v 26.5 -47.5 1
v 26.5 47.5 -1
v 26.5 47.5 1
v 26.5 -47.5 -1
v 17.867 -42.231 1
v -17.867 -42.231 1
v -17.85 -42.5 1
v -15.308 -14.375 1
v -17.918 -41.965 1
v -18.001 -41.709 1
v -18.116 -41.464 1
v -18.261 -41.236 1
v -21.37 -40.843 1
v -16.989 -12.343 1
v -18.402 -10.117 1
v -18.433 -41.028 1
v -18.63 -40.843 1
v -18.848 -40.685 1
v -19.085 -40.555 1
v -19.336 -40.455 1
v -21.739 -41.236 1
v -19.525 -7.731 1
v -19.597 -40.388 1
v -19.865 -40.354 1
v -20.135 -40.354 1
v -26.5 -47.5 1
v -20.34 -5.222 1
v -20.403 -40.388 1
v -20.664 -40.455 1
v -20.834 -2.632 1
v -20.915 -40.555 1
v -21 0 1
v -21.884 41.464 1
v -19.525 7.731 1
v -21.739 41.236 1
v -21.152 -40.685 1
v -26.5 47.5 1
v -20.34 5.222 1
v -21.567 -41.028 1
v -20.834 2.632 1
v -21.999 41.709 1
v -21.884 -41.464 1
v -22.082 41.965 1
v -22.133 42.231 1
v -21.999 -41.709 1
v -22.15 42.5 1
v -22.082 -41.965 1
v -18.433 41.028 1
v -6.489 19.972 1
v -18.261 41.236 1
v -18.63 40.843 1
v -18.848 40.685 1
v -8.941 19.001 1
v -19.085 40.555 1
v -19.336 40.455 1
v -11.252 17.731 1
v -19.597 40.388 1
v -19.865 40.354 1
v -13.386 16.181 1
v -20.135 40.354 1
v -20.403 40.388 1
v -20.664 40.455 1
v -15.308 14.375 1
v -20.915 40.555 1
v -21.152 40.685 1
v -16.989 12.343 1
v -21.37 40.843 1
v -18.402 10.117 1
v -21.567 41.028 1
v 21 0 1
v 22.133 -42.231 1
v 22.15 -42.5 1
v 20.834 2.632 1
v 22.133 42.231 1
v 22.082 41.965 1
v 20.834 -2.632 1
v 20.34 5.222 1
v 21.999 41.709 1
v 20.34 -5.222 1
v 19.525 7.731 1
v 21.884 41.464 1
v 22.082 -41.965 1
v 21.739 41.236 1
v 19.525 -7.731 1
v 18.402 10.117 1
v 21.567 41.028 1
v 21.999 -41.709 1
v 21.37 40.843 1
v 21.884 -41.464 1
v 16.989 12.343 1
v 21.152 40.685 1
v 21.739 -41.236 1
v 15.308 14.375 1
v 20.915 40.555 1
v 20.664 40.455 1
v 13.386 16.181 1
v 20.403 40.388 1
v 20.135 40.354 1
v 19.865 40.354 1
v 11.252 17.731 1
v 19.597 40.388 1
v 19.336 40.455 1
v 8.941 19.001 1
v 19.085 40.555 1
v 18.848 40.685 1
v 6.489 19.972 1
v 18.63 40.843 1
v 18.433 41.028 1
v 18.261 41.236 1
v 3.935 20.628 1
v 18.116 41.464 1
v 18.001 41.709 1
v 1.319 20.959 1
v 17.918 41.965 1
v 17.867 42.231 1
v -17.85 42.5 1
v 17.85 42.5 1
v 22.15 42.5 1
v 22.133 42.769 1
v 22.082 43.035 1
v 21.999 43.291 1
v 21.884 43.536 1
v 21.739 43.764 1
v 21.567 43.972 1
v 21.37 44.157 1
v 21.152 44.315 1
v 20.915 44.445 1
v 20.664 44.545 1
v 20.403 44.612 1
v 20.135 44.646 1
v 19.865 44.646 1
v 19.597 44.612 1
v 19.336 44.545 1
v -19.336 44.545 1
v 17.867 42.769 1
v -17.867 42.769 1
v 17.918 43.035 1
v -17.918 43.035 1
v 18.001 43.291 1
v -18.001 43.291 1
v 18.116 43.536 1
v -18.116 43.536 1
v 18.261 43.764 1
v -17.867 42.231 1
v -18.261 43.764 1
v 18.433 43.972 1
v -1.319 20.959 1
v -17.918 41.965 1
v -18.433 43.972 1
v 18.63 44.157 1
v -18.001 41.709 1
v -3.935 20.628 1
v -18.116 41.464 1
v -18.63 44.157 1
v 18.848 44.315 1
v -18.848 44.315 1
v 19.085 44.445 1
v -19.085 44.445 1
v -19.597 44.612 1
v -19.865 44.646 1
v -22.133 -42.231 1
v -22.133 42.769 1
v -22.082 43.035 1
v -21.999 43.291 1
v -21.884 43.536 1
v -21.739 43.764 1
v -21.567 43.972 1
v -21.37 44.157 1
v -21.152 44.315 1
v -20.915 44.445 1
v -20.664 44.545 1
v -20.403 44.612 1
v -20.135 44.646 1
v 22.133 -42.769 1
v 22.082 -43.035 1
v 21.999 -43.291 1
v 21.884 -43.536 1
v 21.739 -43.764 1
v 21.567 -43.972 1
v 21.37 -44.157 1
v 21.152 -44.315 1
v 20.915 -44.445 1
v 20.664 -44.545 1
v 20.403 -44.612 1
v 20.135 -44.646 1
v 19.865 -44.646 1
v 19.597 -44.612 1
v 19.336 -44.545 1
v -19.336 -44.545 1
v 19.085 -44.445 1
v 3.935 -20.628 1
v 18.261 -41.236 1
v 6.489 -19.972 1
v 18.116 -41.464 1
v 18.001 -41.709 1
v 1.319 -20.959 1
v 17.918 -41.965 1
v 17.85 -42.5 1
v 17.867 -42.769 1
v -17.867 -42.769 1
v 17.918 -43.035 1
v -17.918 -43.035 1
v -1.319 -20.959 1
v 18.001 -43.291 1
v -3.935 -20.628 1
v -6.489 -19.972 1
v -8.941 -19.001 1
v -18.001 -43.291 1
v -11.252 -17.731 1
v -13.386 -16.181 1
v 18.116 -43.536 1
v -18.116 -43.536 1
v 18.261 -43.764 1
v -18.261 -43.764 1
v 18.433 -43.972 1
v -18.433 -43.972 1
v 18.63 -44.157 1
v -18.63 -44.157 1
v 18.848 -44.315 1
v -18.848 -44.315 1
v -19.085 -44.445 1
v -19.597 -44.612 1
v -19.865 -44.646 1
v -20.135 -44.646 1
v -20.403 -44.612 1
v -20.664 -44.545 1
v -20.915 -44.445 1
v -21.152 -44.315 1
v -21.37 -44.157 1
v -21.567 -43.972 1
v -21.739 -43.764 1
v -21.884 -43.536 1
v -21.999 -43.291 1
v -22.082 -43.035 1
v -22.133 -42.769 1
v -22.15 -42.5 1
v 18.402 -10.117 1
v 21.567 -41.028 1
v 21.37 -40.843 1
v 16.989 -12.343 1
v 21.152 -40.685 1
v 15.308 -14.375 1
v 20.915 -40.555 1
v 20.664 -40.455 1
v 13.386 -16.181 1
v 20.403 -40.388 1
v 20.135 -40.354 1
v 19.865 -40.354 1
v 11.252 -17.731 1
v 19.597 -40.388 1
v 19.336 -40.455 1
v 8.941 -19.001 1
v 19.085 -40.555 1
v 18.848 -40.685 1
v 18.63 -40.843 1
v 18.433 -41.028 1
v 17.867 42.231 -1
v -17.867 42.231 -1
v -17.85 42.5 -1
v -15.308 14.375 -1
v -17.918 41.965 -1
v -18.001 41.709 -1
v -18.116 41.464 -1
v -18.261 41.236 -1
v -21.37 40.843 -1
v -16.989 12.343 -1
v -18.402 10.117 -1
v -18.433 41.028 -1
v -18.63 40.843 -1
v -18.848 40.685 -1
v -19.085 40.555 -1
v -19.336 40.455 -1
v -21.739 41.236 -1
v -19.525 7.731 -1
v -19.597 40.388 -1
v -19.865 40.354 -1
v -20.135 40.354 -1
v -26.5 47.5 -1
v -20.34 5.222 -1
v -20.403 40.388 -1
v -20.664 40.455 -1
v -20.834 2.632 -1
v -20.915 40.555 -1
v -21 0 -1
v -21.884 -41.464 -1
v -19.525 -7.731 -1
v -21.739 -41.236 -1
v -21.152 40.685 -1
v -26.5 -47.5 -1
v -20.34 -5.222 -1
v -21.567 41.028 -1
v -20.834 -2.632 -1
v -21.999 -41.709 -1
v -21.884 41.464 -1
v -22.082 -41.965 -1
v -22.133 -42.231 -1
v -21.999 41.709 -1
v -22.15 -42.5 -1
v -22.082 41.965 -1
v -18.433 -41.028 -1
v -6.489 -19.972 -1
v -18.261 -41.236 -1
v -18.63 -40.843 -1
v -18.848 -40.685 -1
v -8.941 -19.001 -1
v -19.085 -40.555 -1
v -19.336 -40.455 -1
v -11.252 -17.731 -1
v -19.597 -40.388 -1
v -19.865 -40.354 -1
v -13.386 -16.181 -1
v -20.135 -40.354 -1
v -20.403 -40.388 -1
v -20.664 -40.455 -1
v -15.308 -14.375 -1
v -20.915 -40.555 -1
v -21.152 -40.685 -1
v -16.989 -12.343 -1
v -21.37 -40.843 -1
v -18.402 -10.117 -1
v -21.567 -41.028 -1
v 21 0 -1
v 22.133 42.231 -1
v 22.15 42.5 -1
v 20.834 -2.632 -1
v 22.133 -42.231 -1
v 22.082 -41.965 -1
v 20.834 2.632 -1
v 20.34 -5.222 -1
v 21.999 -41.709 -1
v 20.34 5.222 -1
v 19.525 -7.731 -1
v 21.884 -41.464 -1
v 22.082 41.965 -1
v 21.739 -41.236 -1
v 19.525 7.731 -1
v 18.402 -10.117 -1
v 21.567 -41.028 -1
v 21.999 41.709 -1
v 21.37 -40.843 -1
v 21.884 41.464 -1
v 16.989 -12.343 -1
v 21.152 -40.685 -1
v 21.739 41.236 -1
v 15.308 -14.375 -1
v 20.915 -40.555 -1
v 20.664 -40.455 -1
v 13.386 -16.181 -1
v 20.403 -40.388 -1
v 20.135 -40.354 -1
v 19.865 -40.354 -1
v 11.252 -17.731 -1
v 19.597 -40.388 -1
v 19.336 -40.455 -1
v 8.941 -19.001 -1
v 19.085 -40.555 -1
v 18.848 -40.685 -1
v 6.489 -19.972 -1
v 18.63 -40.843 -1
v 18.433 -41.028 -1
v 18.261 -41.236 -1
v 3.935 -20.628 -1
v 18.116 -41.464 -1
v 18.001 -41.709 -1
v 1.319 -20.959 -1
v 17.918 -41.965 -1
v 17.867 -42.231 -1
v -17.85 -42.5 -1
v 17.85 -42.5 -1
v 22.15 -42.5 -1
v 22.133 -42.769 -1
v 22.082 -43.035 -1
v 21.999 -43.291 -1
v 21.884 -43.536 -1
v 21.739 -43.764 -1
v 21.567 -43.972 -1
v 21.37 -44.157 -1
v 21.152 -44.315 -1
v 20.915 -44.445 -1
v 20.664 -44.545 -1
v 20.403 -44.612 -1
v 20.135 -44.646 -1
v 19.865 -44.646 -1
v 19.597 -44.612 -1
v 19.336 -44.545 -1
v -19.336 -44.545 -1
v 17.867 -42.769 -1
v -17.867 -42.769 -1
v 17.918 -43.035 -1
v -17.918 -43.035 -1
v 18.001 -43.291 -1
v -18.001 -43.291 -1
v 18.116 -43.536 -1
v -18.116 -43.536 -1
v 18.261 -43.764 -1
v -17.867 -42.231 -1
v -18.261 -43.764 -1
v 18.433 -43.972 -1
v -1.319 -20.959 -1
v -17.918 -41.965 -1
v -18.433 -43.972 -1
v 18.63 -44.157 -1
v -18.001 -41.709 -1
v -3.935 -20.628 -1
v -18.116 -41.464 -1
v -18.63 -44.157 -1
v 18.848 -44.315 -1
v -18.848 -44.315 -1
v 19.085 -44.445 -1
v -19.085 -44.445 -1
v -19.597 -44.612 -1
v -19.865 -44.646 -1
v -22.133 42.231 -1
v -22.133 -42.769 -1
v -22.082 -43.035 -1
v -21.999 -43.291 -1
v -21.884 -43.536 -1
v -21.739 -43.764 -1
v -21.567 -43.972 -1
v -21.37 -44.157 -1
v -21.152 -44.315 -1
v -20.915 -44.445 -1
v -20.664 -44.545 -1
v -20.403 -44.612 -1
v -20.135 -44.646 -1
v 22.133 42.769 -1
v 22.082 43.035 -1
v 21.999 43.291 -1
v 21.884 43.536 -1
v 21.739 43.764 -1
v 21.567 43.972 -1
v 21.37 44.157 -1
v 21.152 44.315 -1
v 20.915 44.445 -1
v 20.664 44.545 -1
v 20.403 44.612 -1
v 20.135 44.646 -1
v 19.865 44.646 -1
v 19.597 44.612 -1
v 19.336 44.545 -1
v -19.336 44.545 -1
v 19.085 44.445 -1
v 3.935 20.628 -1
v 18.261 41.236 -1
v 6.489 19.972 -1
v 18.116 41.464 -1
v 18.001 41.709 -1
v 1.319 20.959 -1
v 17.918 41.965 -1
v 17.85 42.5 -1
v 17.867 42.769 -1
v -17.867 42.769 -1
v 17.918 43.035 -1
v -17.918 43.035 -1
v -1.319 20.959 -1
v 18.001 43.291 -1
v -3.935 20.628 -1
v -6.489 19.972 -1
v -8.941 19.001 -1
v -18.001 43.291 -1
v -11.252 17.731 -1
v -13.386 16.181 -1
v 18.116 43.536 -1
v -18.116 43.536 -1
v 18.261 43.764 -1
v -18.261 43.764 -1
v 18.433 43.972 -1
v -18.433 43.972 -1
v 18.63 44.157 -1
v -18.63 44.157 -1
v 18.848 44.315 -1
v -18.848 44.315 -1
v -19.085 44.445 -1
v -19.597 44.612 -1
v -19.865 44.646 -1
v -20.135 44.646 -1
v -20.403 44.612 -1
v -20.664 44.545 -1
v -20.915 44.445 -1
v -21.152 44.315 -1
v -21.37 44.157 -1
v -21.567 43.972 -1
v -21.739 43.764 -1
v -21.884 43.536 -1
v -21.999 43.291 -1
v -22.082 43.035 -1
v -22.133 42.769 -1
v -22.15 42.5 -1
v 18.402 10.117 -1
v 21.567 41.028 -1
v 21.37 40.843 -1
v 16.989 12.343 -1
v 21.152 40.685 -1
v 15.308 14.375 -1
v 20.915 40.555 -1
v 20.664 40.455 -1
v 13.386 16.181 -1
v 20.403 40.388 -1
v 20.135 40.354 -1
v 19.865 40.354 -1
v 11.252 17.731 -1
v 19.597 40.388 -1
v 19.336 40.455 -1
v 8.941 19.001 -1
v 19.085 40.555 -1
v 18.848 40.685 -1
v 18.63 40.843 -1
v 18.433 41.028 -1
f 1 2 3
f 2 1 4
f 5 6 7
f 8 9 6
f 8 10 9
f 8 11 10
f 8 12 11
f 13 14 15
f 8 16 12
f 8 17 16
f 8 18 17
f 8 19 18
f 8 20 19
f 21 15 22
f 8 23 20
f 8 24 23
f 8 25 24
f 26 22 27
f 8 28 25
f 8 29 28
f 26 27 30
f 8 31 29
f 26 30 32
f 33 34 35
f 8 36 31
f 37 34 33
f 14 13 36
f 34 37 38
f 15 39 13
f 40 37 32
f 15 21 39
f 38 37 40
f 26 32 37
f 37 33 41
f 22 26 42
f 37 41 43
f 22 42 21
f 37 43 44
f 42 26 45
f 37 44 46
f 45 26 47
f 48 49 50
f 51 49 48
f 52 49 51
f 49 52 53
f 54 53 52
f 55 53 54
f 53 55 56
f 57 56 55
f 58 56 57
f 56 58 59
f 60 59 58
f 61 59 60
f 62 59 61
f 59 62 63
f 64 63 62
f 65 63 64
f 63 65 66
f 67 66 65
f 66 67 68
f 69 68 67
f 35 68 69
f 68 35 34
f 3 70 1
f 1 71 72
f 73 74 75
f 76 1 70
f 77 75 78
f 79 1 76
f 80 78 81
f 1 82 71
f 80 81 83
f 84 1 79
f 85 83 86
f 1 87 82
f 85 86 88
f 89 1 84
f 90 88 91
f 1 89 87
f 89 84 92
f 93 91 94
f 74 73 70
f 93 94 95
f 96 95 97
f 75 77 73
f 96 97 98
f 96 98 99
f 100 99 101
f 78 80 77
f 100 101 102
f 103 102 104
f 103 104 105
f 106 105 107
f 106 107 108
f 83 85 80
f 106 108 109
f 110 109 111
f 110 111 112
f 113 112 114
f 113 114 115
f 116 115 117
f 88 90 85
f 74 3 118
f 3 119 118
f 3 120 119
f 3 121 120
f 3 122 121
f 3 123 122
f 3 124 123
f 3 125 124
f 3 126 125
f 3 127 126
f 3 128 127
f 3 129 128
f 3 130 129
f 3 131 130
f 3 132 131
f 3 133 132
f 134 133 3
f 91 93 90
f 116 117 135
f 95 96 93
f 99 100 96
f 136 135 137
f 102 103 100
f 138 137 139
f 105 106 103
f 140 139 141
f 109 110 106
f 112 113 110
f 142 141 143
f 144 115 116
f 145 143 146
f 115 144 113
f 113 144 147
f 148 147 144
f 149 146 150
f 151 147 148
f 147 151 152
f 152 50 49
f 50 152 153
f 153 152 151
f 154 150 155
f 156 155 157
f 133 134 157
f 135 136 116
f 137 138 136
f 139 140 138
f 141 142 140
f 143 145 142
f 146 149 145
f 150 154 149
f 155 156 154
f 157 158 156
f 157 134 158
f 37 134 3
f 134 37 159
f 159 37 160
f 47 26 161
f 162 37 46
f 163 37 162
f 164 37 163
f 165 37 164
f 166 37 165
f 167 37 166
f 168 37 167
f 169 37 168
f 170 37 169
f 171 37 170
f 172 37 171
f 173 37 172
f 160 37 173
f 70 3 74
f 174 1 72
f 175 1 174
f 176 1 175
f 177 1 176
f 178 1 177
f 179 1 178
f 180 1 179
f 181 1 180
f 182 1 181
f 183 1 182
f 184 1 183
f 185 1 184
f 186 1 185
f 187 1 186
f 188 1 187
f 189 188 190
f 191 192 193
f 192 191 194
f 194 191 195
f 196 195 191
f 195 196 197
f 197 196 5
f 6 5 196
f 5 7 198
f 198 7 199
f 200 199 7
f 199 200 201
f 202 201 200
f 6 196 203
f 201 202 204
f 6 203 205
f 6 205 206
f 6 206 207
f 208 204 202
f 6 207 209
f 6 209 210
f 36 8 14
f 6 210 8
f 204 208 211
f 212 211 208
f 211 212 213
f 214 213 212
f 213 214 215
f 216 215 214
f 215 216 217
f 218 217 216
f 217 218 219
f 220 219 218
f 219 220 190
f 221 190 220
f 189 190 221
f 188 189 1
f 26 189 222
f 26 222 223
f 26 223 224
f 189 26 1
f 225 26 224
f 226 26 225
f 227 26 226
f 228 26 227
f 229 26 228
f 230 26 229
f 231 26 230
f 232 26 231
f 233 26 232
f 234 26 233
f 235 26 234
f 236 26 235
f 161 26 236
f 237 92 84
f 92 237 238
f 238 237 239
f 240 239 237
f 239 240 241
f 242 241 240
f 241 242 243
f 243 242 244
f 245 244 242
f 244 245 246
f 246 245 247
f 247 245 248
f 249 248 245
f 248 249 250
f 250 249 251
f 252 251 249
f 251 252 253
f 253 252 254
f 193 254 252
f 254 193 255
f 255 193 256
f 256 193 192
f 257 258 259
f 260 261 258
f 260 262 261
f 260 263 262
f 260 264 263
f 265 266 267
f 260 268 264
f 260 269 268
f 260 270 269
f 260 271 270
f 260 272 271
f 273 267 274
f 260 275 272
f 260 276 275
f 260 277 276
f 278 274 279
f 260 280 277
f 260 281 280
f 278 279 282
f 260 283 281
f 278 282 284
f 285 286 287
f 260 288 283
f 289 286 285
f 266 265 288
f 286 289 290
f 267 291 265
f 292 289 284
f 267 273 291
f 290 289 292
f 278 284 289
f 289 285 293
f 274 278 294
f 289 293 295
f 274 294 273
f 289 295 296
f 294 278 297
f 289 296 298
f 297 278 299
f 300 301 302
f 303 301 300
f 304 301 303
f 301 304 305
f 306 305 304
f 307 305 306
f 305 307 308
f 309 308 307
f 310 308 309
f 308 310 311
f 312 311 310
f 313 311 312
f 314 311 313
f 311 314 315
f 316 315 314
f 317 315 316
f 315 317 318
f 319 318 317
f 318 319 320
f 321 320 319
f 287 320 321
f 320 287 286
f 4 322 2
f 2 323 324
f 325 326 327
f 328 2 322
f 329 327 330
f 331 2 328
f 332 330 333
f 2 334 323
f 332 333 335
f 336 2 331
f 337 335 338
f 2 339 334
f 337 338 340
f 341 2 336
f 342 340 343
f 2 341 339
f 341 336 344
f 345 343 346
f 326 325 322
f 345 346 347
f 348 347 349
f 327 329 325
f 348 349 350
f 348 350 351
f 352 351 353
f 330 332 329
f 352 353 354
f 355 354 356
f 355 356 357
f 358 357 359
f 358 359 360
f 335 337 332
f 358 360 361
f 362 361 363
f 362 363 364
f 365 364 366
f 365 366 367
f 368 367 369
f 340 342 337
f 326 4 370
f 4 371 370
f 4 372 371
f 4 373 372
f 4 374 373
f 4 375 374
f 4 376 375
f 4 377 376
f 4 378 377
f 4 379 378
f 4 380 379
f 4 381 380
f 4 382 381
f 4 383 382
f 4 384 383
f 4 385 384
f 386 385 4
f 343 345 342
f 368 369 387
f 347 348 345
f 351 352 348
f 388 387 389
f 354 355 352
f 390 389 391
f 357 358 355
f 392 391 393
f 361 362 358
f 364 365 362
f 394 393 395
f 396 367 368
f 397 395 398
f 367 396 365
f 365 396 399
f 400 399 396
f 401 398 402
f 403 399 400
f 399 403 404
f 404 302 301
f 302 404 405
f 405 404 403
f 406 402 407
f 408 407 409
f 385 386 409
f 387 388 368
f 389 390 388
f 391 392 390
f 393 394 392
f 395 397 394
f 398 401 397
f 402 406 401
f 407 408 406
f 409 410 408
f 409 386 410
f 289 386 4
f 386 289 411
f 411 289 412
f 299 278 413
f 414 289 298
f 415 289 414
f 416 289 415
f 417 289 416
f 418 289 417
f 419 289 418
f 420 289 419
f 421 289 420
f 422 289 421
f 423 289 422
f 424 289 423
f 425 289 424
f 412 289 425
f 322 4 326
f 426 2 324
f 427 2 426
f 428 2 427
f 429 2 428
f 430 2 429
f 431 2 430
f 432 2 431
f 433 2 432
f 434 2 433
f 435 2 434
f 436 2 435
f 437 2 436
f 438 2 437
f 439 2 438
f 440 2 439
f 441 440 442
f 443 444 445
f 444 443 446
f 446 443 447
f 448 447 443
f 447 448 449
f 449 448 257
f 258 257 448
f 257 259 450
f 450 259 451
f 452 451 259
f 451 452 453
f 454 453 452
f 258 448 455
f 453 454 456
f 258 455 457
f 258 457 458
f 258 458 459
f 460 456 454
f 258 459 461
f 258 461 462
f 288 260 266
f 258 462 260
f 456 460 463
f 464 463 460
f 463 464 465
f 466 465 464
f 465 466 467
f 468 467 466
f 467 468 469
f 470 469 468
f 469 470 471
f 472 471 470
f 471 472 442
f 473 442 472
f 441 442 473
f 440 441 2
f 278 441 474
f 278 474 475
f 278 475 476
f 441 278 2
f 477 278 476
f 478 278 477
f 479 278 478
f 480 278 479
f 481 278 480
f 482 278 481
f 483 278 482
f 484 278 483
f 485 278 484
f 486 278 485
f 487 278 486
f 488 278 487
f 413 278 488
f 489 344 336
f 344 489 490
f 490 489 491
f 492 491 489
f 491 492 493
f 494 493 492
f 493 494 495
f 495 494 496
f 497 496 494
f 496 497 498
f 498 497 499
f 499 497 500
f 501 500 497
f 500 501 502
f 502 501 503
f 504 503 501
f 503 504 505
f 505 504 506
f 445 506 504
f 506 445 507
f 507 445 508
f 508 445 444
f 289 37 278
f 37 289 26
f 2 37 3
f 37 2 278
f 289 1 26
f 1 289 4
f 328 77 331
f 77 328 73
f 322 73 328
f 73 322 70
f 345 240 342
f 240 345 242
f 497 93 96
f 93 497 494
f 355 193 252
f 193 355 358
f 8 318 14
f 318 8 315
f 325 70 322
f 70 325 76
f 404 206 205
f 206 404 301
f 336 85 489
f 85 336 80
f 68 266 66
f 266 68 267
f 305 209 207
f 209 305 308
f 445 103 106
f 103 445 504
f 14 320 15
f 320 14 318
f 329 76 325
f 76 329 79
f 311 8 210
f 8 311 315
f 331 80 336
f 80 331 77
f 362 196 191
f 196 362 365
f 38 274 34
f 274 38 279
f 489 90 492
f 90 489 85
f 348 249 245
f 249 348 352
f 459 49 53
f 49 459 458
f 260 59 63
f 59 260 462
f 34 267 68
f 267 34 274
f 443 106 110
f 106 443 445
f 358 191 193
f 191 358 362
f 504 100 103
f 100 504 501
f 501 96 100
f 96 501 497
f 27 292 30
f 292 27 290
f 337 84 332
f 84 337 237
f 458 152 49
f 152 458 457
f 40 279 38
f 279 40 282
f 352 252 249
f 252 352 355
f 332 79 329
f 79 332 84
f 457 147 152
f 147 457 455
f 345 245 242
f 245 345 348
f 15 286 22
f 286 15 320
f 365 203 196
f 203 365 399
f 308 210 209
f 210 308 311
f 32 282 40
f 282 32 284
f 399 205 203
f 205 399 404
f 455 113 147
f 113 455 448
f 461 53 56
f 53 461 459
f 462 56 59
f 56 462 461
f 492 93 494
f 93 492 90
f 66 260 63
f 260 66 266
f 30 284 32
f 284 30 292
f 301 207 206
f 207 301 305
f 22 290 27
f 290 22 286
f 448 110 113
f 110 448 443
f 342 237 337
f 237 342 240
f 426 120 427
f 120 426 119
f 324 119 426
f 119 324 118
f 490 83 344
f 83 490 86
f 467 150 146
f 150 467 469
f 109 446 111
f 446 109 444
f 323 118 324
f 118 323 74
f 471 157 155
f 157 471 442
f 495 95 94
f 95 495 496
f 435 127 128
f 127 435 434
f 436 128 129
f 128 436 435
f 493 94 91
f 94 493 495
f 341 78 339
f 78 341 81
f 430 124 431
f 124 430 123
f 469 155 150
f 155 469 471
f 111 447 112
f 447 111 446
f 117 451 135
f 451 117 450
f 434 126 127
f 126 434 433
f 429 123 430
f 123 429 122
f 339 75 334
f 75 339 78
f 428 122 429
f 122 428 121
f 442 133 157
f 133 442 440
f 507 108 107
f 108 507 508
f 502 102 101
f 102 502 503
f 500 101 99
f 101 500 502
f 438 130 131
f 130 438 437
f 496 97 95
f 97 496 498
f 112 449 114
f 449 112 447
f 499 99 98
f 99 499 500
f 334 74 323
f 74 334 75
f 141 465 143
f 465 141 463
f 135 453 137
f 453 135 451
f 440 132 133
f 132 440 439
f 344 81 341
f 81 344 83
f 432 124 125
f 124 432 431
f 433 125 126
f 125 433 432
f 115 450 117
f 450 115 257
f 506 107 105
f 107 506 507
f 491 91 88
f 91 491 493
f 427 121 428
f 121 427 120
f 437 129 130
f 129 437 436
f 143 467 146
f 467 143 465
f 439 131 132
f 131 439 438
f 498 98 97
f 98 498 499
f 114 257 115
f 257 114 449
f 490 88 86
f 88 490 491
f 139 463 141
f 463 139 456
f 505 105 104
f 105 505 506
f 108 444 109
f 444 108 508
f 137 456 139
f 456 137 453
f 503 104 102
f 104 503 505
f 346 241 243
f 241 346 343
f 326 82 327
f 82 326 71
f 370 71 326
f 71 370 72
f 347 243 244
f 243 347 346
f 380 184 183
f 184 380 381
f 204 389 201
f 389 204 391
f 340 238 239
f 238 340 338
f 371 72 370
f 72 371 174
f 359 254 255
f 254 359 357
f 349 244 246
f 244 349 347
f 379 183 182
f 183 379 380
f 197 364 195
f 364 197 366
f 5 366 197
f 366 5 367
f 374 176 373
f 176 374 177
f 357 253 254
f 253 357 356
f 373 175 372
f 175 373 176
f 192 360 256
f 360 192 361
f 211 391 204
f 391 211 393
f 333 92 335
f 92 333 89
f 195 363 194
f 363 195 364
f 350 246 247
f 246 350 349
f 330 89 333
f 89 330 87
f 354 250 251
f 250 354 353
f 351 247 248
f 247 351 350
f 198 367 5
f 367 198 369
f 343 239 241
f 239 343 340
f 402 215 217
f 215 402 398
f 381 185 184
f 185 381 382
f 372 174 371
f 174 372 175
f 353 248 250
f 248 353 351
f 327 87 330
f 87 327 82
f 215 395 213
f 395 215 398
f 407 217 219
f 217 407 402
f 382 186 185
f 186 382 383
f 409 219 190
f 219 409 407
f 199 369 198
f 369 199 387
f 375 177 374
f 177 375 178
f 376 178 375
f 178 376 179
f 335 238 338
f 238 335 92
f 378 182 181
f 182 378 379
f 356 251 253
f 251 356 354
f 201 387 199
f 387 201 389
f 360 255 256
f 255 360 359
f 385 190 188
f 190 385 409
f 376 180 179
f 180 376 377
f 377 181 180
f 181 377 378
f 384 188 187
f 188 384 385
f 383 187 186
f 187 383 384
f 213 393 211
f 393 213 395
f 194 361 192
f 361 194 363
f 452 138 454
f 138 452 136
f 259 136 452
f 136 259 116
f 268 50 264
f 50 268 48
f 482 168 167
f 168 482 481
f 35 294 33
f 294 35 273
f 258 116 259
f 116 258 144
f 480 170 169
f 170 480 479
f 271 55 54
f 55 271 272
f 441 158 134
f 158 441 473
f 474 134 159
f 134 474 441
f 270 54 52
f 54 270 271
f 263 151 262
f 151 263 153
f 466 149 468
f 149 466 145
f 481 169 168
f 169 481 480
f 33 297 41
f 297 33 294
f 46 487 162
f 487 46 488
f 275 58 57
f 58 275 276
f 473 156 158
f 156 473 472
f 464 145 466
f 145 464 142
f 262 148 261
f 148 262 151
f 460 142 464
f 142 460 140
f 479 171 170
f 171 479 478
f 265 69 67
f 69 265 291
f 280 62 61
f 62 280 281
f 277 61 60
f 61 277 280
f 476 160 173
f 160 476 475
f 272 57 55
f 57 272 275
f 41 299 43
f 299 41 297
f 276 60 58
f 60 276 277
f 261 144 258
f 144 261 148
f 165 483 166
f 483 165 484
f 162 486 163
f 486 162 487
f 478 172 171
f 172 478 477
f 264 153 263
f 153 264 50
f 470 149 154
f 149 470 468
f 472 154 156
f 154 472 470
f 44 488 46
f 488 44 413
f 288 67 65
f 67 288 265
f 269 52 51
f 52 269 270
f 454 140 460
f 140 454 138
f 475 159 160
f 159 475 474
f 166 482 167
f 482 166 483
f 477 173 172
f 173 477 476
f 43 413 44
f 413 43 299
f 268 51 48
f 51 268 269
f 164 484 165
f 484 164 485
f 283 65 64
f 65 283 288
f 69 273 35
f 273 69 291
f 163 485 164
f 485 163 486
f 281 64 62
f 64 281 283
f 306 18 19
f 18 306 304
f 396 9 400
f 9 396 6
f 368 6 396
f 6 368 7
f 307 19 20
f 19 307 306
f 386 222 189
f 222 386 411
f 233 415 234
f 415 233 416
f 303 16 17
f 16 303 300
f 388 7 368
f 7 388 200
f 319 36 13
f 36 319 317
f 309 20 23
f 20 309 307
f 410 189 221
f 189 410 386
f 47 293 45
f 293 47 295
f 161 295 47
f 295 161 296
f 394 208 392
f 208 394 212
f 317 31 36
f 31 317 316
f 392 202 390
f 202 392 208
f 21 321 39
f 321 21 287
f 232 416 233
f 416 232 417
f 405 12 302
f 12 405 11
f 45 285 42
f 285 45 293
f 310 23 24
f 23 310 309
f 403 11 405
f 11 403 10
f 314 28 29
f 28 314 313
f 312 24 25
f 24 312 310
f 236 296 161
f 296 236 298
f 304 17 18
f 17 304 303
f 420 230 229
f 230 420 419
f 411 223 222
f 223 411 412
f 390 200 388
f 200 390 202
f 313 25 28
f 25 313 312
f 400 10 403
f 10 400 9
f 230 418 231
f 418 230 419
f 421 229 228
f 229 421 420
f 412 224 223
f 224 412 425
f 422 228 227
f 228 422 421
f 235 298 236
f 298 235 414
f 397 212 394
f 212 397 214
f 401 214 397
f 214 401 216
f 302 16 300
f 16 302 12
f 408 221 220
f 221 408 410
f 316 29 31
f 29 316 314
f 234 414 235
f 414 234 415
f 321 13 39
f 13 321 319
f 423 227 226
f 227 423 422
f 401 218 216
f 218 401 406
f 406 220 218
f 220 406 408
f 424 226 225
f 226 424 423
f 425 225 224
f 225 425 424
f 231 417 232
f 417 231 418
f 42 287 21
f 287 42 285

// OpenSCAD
// file: roundedcube.scad
// More information: https://danielupshaw.com/openscad-rounded-corners/

// Set to 0.01 for higher definition curves (renders slower)
$fs = 0.15;

module roundedcube(size = [1, 1, 1], center = false, radius = 0.5, apply_to = "all") {
	// If single value, convert to [x, y, z] vector
	size = (size[0] == undef) ? [size, size, size] : size;

	translate_min = radius;
	translate_xmax = size[0] - radius;
	translate_ymax = size[1] - radius;
	translate_zmax = size[2] - radius;

	diameter = radius * 2;

	obj_translate = (center == false) ?
		[0, 0, 0] : [
			-(size[0] / 2),
			-(size[1] / 2),
			-(size[2] / 2)
		];

	translate(v = obj_translate) {
		hull() {
			for (translate_x = [translate_min, translate_xmax]) {
				x_at = (translate_x == translate_min) ? "min" : "max";
				for (translate_y = [translate_min, translate_ymax]) {
					y_at = (translate_y == translate_min) ? "min" : "max";
					for (translate_z = [translate_min, translate_zmax]) {
						z_at = (translate_z == translate_min) ? "min" : "max";

						translate(v = [translate_x, translate_y, translate_z])
						if (
							(apply_to == "all") ||
							(apply_to == "xmin" && x_at == "min") || (apply_to == "xmax" && x_at == "max") ||
							(apply_to == "ymin" && y_at == "min") || (apply_to == "ymax" && y_at == "max") ||
							(apply_to == "zmin" && z_at == "min") || (apply_to == "zmax" && z_at == "max")
						) {
							sphere(r = radius);
						} else {
							rotate = 
								(apply_to == "xmin" || apply_to == "xmax" || apply_to == "x") ? [0, 90, 0] : (
								(apply_to == "ymin" || apply_to == "ymax" || apply_to == "y") ? [90, 90, 0] :
								[0, 0, 0]
							);
							rotate(a = rotate)
							cylinder(h = diameter, r = radius, center = true);
						}
					}
				}
			}
		}
	}
}
// file: parameters.scad
/*
 * SPDX-FileCopyrightText: © 2023 Brian S. Stephan <bss@incorporeal.org>
 * SPDX-License-Identifier: GPL-3.0-or-later
 */

// adjustments
hole_tolerance = 0.15;

// M2
m2_screw_selftap_radius = 0.95;

// M3
m3_screw_selftap_radius = 1.3;

// M4
m4_bolt_radius = 2 + hole_tolerance;
m4_bolt_countersink_radius = 6.1 + hole_tolerance;
m4_bolt_hex_exterior_radius = 3.6 + hole_tolerance;

// 24mm button
small_button_radius = 12 + hole_tolerance;

// 30mm button
big_button_radius = 15 + hole_tolerance;

// JLF mount dimensions
lever_mount_x = 53;
lever_mount_y = 95;
lever_mount_z = 2;

// standard lever hole
lever_plate_hole = 12;

// case dimensions
// base frame box. reminder: top of inside (including mounts) is chopped by panel_z for plates
frame_x = 233;
frame_y = 208;
frame_z = 57;

frame_center_to_neutrik = 70;

// depth of the "lip" of the frame that the top plate sets into/supports the overhang
frame_wall = 4;

// per neutrik (mm)
neutrik_panel_thickness = 3;

// top plate, which can either be the whole plate ("inset") or the mounting frame for a plate that overhangs
panel_x = frame_x - (frame_wall * 2);
panel_y = frame_y - (frame_wall * 2);
panel_z = 5;

// how much the top plate x/y is expanded to overhang the frame
// note that this is relative to the top plate (so the wall is added back)
panel_overhang_amount = 8.5;
overhang_panel_x = panel_x + (frame_wall * 2) + (panel_overhang_amount * 2);
overhang_panel_y = panel_y + (frame_wall * 2) + (panel_overhang_amount * 2);

panel_to_frame_point_x = (panel_x/2)-10;
panel_to_frame_point_y = (panel_y/2)-10;

// frame interior that supports the top plates
panel_support_width = 5;

// neutrik D screw holes
neutrik_d_screw_radius = 1.6 + hole_tolerance;
neutrik_d_radius = 12 + hole_tolerance;

// additional button radius for decorative panels, etc.
decorative_radius_scale = 1.75;
jumbo_decorative_radius_scale = 2;
// main file
/*
 * SPDX-FileCopyrightText: © 2023 Brian S. Stephan <bss@incorporeal.org>
 * SPDX-License-Identifier: GPL-3.0-or-later
 */

include <parameters.scad>
include <components.scad>

module sanwa_seimitsu_lever_mount() {
	difference() {
		levermountbase();
		levermountholes();
	}
}

sanwa_seimitsu_lever_mount();
